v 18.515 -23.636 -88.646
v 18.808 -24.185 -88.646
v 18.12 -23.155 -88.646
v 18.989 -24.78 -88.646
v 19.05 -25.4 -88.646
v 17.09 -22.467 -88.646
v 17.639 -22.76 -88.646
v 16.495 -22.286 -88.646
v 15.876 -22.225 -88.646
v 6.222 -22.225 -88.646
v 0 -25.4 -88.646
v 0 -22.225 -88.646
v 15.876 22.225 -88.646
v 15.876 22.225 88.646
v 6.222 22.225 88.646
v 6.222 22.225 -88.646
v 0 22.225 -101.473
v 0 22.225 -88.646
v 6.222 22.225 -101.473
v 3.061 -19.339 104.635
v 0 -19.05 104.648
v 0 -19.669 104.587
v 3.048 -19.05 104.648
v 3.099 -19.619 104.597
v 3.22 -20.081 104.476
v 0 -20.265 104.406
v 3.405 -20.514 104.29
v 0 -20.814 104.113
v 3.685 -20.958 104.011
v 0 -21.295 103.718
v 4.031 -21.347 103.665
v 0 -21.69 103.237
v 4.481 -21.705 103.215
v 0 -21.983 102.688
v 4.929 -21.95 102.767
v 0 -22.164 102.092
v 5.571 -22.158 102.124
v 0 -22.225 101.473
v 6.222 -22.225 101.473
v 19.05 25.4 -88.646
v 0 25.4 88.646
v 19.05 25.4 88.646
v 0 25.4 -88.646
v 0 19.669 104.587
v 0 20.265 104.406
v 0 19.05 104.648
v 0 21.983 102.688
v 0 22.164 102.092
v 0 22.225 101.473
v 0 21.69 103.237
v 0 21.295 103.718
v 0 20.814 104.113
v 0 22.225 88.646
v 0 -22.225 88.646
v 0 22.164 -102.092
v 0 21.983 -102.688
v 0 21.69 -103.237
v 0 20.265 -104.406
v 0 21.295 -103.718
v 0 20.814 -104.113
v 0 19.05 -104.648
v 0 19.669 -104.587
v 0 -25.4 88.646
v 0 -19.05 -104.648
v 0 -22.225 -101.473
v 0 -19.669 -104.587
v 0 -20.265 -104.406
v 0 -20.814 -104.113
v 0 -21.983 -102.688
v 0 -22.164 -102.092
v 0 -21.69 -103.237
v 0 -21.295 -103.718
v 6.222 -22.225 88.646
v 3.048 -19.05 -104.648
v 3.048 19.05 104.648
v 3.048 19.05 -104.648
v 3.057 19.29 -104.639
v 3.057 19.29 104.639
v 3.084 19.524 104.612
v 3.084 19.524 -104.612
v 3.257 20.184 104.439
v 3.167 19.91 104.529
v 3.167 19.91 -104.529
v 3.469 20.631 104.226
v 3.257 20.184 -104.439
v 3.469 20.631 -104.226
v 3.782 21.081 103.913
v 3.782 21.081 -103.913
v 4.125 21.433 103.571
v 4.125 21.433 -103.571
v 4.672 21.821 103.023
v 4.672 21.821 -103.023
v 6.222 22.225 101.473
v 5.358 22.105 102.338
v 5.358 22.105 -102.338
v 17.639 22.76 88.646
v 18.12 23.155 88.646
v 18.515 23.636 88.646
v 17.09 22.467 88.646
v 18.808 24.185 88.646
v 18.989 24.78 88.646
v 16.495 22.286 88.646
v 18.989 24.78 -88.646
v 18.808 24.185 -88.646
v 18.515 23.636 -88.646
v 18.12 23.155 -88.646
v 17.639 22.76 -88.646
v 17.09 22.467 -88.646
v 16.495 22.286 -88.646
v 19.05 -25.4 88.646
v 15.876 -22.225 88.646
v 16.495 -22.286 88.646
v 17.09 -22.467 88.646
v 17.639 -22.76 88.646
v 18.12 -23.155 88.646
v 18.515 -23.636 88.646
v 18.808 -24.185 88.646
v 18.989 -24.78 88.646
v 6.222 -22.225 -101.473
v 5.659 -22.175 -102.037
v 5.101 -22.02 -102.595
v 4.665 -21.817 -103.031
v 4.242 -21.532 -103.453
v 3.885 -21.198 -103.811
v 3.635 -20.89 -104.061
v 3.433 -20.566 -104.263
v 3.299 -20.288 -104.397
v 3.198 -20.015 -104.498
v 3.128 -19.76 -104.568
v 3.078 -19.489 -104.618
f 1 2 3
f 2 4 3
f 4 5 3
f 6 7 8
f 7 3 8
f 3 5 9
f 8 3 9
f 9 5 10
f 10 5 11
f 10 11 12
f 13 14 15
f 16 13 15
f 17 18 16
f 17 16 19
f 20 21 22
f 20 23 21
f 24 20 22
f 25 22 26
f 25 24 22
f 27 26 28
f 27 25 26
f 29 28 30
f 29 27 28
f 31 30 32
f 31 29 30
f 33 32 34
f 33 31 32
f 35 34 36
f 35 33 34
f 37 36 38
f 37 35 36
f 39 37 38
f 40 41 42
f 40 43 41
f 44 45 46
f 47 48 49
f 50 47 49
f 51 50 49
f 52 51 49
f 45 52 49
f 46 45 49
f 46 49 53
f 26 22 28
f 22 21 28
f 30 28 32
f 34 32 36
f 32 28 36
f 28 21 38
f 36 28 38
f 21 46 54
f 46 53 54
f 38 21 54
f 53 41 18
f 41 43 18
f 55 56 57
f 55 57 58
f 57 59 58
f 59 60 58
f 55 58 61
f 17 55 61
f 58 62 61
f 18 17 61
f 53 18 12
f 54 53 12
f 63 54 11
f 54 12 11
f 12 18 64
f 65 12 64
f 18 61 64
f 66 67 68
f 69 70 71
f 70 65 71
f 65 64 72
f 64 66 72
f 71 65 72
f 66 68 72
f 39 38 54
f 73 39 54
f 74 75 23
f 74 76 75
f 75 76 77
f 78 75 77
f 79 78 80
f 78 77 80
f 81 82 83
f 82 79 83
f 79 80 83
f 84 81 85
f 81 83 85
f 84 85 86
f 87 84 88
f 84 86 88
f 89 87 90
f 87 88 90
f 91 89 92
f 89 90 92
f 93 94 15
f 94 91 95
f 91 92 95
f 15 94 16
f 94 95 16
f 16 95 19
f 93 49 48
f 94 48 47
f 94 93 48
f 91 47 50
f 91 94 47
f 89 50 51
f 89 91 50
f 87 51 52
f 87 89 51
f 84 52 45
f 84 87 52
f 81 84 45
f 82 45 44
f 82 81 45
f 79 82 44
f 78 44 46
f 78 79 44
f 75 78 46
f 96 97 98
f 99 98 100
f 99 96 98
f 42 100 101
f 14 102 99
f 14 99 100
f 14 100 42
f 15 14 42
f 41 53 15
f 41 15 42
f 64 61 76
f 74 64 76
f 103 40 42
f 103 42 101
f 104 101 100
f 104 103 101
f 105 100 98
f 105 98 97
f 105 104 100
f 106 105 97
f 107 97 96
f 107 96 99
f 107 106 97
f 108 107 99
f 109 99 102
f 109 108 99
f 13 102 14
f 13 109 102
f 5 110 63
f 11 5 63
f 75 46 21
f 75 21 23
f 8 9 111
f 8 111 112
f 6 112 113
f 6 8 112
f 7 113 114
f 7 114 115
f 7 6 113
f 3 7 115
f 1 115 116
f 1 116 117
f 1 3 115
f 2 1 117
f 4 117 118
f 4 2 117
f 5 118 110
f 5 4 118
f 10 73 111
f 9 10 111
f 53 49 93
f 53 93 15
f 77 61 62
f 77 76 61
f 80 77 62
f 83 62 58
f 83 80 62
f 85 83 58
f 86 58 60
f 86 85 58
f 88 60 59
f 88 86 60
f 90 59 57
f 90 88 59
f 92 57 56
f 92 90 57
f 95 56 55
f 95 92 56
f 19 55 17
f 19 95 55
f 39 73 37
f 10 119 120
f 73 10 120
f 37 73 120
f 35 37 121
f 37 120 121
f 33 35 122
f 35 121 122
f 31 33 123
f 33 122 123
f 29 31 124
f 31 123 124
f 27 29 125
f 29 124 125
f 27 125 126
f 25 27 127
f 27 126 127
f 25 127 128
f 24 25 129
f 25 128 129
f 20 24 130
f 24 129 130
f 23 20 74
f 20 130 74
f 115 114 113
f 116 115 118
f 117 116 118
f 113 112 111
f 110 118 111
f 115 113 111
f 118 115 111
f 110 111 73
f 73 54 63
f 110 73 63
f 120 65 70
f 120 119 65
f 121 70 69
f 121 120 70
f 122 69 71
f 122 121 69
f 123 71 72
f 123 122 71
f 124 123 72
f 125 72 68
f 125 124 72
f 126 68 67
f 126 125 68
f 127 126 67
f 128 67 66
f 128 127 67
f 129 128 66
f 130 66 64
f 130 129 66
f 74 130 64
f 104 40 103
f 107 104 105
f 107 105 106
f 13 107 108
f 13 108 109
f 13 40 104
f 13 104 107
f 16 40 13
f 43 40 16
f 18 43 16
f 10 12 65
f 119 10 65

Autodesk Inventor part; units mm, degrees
ref_plane "YZ Plane" through (0, 0, 0) normal (1, 0, 0) x (0, 1, 0)
ref_plane "XZ Plane" through (0, 0, 0) normal (0, 1, 0) x (-1, 0, 0)
ref_plane "XY Plane" through (0, 0, 0) normal (0, 0, 1) x (1, 0, 0)
sketch "Sketch3" plane through (0, 0, 0) normal (0, 0, 1) x (1, 0, 0)
  line L0 (0, 25.4) -> (0, -25.4)
  line L1 (0, 25.4) -> (19.05, 25.4)
  line L2 (19.05, 25.4) -> (19.05, 22.225)
  line L3 (19.05, 22.225) -> (3.048, 22.225)
  line L4 (3.048, 22.225) -> (3.048, -22.225)
  line L5 (3.048, -22.225) -> (19.05, -22.225)
  line L6 (19.05, -22.225) -> (19.05, -25.4)
  line L7 (19.05, -25.4) -> (0, -25.4)
  line L8 (0, 0) -> (3.048, 0) construction
  dimension "d7" = 50.8
  dimension "d10" = 19.05
  dimension "d19" = 3.175
  dimension "d20" = 16.002
extrude "Extrusion3" add sketch "Sketch3" along normal mid plane 209.296
fillet "Fillet1" radius 3.175 4 edges at (19.05, 22.225, 0) (19.05, -22.225, 0) (3.048, -22.225, 0) (3.048, 22.225, 0)
sketch "Sketch4" plane through (0, -25.4, 104.648) normal (-1, 0, 0) x (0, 0, 1)
  line L0 (0, 50.8) -> (-209.296, 50.8) projected
  line L1 (-209.296, 50.8) -> (-193.294, 50.8)
  line L2 (-193.294, 50.8) -> (-193.294, 47.625)
  line L3 (-193.294, 47.625) -> (-209.296, 47.625)
  line L4 (-209.296, 47.625) -> (-209.296, 50.8)
  line L5 (0, 44.45) -> (-209.296, 44.45) projected
  line L6 (-209.296, 6.35) -> (0, 6.35) projected
  line L7 (-209.296, 0) -> (0, 0) projected
  line L8 (-209.296, 0) -> (0, 0) projected
  line L9 (-209.296, 0) -> (-193.294, 0)
  line L10 (-193.294, 0) -> (-193.294, 3.175)
  line L11 (-193.294, 3.175) -> (-209.296, 3.175)
  line L12 (-209.296, 3.175) -> (-209.296, 0)
  line L13 (0, 3.175) -> (-209.296, 3.175) projected
  line L14 (-209.296, 47.625) -> (0, 47.625) projected
  point P0 (-104.648, 25.4)
  dimension "d14" = 16.002
extrude "Extrusion4" cut sketch "Sketch4" against normal through all
mirror "Mirror1" about plane through (0, 0, 0) normal (0, 0, 1) of "Extrusion4"
fillet "Fillet3" radius 3.175 4 edges at (3.1112, 22.225, -104.648) (3.1113, -22.225, -104.648) (3.1112, 22.225, 104.648) (3.1113, -22.225, 104.648)
equation "\"d11\" = Length"
equation "\"Length\" = 209.296"
properties part number "NASA-20-FR-BK-01" material "Aluminum 6061"
